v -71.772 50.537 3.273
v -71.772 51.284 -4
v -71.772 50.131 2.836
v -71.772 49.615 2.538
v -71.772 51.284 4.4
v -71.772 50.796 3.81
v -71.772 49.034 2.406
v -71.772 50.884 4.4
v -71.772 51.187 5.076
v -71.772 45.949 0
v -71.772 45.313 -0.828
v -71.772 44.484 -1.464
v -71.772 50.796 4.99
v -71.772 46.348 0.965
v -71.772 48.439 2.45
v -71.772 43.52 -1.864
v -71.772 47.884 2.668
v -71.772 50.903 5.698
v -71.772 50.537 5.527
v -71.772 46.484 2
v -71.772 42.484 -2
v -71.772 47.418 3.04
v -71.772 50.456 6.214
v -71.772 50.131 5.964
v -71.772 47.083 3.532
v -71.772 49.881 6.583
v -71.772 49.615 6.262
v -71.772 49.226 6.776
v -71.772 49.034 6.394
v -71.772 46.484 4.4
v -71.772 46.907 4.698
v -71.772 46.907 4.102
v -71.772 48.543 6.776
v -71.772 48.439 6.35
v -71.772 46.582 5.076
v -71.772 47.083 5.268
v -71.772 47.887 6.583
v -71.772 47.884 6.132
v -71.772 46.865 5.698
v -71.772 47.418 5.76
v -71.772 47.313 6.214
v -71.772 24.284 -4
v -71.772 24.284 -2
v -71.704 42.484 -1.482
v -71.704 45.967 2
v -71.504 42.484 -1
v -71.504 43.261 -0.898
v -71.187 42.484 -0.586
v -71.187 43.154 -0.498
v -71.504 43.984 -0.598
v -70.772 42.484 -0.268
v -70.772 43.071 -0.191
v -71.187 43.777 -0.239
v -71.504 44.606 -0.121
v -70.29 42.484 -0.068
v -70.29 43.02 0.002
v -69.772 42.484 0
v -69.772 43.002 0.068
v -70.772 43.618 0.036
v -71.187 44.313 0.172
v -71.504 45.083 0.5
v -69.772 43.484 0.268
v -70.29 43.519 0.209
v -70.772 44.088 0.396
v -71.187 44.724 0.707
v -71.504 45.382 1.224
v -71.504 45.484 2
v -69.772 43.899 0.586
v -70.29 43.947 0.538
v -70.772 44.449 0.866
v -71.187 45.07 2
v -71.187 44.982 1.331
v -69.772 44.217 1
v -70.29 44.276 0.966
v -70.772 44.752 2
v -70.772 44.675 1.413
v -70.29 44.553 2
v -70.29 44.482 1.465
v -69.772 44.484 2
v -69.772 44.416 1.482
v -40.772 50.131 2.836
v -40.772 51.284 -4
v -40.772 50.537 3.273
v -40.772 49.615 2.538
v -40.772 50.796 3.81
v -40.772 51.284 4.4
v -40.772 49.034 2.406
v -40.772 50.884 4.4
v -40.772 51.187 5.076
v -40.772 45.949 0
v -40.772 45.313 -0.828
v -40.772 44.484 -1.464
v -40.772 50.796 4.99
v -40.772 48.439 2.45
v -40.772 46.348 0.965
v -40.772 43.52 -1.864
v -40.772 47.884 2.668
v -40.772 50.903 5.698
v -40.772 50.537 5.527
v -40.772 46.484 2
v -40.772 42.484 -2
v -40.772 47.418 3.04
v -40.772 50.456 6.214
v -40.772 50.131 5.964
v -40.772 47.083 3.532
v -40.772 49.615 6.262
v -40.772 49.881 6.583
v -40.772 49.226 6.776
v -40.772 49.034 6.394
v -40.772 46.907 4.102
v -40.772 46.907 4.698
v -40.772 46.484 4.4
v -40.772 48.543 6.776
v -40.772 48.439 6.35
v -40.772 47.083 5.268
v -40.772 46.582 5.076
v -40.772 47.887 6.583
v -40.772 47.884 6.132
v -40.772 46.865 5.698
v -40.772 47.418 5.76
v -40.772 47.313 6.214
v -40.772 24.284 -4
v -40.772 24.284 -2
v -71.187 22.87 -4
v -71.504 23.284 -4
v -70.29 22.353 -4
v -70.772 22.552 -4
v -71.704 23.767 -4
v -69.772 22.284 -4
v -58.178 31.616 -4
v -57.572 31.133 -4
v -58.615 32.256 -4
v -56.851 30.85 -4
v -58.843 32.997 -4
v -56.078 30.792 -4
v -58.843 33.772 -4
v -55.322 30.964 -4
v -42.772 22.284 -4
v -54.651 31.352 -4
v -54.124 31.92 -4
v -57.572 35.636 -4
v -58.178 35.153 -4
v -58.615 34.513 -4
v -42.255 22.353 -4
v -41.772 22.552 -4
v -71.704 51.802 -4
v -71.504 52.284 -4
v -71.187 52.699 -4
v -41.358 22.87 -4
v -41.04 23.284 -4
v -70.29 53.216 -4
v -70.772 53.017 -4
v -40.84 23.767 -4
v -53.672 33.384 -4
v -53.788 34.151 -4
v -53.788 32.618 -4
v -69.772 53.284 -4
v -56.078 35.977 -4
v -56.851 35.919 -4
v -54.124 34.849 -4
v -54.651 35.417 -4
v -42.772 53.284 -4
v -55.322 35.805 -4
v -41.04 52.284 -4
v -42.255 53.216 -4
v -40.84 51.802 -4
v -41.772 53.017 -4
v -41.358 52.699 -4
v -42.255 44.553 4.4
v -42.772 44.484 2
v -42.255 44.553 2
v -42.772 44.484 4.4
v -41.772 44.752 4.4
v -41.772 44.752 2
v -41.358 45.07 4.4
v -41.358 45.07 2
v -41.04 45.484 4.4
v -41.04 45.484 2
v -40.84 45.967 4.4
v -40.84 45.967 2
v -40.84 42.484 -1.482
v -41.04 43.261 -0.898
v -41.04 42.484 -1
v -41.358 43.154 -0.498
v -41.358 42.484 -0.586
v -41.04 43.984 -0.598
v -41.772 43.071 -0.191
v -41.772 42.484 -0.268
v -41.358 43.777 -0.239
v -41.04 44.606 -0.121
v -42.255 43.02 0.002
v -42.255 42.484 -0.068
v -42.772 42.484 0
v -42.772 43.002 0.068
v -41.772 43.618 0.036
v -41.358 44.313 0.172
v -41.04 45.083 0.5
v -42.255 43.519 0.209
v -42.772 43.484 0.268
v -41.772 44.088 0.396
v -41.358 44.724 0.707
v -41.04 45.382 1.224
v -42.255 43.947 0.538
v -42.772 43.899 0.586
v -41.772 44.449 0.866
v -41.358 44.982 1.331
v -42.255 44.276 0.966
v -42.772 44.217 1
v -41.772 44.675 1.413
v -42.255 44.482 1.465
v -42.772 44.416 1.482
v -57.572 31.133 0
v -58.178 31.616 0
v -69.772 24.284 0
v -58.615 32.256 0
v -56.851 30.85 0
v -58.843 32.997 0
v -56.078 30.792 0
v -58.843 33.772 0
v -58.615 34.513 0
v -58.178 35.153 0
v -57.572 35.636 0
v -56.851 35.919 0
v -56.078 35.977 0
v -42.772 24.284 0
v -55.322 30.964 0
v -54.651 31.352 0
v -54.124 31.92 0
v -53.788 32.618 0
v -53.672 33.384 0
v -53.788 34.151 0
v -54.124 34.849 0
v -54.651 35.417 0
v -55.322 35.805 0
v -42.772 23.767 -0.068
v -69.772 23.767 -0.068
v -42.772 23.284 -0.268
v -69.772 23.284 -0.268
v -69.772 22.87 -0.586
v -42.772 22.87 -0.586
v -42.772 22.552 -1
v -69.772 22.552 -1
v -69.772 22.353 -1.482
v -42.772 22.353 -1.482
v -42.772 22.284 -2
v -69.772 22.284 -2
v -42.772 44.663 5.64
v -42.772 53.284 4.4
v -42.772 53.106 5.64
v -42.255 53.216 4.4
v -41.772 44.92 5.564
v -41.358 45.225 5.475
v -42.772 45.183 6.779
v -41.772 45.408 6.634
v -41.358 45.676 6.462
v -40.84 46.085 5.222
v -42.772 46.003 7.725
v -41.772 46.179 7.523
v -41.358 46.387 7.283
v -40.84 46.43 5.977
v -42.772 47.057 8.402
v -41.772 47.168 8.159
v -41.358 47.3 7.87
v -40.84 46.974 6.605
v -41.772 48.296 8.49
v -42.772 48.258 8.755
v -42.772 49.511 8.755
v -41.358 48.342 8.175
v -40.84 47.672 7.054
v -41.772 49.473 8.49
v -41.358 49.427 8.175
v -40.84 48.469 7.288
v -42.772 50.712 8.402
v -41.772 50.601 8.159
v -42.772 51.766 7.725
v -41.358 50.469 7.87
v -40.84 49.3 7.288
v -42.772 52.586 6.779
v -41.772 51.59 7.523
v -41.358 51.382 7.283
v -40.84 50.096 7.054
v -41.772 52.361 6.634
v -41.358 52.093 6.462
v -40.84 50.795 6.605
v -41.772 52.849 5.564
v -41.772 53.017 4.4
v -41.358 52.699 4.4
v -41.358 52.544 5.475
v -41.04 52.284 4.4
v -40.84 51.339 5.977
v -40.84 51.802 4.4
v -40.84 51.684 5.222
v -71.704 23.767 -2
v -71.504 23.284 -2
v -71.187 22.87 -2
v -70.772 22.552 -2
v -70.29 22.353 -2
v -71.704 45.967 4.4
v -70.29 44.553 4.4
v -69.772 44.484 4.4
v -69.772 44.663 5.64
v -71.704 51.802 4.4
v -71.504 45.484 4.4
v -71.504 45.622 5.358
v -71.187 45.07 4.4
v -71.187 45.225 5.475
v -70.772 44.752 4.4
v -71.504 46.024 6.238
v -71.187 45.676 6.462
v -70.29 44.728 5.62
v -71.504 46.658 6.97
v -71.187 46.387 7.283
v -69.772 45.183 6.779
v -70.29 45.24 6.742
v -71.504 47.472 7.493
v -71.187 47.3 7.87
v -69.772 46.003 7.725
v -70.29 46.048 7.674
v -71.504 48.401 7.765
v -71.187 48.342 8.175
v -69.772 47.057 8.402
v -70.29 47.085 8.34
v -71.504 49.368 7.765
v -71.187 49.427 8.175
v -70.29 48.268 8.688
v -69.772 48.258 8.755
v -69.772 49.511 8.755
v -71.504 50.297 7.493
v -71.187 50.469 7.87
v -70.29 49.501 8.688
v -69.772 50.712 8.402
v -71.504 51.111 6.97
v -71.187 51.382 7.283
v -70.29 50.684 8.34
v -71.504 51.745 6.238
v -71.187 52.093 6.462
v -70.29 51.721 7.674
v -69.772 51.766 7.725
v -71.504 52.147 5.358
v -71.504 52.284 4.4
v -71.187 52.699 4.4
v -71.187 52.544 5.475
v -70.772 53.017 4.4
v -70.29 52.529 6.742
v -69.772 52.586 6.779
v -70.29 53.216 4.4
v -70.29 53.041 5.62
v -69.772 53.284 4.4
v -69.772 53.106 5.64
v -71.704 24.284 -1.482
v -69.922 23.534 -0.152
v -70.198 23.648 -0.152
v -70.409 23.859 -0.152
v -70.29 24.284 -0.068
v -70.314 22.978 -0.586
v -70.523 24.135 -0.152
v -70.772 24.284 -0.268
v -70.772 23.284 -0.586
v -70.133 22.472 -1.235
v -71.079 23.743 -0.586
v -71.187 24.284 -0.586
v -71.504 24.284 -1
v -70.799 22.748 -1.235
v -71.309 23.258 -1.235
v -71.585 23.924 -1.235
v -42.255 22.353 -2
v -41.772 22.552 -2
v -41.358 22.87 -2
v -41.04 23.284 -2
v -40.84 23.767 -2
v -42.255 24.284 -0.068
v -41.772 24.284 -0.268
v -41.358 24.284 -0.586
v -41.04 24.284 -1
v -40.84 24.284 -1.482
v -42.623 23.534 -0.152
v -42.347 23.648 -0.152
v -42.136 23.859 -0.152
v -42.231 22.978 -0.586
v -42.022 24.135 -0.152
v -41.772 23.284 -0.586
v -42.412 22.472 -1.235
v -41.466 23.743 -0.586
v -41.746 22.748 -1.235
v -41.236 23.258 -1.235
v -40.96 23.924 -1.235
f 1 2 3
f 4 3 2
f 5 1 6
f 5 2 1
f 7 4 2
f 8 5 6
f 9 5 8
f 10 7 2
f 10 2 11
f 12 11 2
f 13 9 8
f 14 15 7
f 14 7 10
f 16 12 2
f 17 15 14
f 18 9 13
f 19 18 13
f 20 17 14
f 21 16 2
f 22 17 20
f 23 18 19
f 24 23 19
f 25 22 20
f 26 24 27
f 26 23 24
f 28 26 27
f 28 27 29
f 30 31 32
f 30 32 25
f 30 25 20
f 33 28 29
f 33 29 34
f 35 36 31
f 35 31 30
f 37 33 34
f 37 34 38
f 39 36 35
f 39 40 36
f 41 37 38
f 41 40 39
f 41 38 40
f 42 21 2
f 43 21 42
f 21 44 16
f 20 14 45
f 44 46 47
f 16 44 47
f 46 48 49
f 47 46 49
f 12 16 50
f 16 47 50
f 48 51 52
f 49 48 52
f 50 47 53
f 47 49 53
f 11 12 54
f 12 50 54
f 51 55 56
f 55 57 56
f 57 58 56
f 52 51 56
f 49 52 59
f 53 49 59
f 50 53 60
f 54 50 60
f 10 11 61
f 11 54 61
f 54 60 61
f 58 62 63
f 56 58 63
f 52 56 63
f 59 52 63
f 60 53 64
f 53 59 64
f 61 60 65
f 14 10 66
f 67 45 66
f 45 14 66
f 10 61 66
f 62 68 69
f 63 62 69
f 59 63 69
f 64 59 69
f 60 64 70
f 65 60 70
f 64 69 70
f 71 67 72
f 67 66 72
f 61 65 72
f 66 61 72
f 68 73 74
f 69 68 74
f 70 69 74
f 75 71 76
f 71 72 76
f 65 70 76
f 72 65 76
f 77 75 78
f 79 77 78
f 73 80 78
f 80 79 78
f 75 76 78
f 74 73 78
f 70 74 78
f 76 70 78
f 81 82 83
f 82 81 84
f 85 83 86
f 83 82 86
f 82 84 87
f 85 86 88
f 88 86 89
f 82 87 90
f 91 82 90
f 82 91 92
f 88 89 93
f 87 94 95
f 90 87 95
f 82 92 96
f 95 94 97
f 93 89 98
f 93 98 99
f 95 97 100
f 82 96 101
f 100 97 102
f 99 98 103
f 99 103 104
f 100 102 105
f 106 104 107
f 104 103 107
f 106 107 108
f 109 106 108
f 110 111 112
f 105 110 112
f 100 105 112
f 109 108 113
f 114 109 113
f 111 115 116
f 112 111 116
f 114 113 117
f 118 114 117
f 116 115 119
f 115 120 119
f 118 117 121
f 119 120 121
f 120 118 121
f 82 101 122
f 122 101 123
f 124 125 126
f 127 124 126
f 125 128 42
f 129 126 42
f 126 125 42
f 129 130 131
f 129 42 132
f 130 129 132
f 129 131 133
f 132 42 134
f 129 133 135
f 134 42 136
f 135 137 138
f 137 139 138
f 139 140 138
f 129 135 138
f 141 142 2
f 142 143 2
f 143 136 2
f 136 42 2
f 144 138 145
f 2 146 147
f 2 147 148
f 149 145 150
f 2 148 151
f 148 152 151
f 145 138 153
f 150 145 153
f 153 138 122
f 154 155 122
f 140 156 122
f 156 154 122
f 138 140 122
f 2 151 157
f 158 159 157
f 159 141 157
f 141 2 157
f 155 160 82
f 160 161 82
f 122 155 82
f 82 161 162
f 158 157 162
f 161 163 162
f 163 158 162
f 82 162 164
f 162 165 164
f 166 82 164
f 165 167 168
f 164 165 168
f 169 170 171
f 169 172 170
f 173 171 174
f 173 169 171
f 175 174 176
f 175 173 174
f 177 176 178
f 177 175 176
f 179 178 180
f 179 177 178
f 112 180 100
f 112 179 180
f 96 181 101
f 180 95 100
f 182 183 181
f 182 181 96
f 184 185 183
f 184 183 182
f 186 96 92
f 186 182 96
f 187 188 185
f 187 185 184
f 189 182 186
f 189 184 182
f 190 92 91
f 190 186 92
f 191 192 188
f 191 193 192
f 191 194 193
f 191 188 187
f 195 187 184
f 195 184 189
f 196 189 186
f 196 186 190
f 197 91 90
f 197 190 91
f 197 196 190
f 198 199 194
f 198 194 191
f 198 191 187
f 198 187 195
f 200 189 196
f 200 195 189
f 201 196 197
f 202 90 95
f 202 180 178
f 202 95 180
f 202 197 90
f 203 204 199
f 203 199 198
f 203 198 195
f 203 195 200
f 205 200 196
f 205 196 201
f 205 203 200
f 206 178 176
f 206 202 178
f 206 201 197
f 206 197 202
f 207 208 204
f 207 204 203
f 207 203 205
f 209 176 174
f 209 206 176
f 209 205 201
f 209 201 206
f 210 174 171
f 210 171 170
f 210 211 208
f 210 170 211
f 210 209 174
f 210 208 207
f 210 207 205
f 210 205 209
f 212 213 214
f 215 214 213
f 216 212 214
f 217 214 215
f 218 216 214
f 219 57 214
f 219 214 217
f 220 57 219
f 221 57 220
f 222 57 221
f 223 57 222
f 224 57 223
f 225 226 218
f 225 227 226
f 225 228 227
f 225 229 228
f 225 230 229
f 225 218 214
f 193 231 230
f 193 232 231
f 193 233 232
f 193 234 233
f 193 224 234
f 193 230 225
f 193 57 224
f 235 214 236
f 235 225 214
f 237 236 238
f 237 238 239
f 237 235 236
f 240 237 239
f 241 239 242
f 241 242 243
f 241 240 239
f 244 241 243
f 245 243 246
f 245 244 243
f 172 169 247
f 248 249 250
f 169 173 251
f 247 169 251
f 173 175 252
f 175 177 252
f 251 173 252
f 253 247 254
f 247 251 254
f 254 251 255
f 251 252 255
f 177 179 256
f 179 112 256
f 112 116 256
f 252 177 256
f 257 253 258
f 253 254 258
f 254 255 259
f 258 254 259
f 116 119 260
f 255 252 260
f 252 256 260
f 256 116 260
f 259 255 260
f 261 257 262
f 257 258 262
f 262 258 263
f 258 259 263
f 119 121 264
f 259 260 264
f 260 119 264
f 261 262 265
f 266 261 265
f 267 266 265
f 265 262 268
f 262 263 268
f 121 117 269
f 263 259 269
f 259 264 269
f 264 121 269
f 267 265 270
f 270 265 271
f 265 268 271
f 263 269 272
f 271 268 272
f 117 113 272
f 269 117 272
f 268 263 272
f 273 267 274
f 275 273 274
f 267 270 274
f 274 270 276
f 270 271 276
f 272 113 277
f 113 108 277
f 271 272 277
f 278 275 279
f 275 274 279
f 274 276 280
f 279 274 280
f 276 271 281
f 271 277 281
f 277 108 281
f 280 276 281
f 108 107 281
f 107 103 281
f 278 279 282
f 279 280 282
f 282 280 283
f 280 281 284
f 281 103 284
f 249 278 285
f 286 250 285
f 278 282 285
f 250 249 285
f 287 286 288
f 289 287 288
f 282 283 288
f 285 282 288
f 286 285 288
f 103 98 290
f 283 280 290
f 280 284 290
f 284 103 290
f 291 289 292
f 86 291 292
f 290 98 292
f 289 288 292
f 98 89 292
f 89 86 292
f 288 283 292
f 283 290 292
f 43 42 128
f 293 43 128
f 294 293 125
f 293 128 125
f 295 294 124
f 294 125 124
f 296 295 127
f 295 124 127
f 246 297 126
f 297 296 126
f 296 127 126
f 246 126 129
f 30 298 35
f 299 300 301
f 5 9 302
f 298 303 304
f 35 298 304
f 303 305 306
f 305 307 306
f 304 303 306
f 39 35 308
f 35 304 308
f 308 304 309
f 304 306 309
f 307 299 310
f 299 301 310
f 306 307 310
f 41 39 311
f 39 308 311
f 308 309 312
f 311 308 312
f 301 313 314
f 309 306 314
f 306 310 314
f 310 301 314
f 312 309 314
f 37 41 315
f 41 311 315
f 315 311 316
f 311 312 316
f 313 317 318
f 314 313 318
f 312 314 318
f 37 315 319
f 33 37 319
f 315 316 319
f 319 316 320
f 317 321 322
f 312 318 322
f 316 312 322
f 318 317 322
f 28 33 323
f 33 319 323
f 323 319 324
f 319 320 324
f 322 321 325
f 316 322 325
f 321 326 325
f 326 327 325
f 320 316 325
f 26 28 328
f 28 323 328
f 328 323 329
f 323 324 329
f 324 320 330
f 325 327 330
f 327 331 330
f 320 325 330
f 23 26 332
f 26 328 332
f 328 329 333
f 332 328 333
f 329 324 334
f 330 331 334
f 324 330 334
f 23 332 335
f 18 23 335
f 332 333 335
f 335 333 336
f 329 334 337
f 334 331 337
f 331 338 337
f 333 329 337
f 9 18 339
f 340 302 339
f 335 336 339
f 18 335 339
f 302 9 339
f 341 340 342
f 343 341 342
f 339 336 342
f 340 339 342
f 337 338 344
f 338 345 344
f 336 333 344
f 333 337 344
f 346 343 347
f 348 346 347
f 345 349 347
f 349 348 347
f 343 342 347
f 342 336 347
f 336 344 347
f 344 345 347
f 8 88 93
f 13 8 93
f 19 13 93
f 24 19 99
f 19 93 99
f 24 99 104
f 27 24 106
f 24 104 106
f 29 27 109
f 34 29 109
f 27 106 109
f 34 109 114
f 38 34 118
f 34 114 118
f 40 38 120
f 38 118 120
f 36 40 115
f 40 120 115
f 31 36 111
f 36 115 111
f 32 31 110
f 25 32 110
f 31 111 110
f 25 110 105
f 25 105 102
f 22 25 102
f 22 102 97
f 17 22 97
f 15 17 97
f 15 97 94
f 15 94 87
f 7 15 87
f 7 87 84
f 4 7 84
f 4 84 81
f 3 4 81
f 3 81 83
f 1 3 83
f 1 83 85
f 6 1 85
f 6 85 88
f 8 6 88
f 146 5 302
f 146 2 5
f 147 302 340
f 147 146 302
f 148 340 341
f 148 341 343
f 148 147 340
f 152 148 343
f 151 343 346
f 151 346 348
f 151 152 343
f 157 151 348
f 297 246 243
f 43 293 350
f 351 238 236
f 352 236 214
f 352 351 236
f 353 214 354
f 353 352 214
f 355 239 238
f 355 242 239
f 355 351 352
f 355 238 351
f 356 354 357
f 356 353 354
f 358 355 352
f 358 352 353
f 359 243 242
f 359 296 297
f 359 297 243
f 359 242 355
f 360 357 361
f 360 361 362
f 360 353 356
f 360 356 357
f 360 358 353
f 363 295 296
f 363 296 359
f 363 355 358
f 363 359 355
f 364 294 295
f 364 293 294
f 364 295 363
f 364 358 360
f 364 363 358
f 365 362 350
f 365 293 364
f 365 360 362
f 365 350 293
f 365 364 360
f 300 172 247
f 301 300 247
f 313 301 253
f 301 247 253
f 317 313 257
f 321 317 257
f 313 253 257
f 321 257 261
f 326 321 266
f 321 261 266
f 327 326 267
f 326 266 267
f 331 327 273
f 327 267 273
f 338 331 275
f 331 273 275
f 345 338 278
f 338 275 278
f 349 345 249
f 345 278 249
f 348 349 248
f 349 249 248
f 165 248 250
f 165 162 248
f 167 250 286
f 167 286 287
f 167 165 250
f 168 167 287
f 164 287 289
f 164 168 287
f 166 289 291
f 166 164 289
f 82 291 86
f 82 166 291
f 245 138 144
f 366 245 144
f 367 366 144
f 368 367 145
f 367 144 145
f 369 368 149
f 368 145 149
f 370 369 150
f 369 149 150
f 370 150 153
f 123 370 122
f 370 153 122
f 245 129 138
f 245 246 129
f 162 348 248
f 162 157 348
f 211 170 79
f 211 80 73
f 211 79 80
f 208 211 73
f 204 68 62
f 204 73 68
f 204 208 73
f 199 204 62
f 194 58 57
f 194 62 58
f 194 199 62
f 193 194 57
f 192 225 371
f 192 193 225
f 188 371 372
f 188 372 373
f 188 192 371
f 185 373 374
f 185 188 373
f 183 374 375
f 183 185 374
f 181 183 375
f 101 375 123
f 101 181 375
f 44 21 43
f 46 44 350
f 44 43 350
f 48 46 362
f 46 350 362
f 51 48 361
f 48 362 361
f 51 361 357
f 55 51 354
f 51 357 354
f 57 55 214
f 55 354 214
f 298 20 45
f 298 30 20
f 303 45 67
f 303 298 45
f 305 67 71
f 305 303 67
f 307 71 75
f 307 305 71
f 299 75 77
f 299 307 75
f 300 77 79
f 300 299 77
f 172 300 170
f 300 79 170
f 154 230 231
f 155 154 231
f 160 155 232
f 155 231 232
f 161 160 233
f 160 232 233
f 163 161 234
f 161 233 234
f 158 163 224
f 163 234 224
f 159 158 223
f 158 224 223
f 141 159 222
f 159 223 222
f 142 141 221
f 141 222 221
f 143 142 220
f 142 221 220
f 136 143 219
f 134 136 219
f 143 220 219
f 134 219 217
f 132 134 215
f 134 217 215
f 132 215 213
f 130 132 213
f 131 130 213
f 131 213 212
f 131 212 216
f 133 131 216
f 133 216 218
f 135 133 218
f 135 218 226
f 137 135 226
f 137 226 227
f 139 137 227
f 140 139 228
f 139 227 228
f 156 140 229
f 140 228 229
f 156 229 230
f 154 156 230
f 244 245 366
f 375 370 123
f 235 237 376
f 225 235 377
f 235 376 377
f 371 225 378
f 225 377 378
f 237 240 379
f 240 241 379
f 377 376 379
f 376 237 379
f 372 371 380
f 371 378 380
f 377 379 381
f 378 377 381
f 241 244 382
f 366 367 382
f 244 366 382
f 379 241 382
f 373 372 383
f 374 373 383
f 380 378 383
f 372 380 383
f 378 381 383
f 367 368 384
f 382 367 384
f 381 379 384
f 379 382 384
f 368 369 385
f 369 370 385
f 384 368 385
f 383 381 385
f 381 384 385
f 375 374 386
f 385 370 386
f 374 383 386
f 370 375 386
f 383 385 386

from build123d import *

# Parameters (mm, degrees)
F0_W     = 31
F0_H     = 8.8
F0_H_2   = 22.2
F0_R     = 2.6
F1_DEPTH = 4
F2_DEPTH = 4.4
F3_W     = 31
F3_H     = 4.4
F5_R     = 2
F6_DEPTH = 31.001
F7_R     = 2


with BuildPart() as f1:
    # F0 (on Top) → F1 (new body)
    with BuildSketch(Plane.XY):
        with Locations((-56.2723039389, 48.8844518721)):
            Rectangle(F0_W, F0_H)
        with Locations((-56.2723039389, 33.3844518721)):
            Rectangle(F0_W, F0_H_2)
        with Locations((-56.2723039389, 33.3844518721)):
            Circle(F0_R, mode=Mode.SUBTRACT)
    extrude(amount=-F1_DEPTH)

    # F0 (on Top) → F2 (join)
    with BuildSketch(Plane.XY):
        with Locations((-56.2723039389, 48.8844518721)):
            Rectangle(F0_W, F0_H)
    extrude(amount=F2_DEPTH)

    # F3 (on face) → F4 (revolve)
    with BuildSketch(Plane.XY.offset(4.4)):
        with Locations((-56.2723039389, 46.6844518721)):
            Rectangle(F3_W, F3_H)
    revolve(axis=Axis((-56.2723039389, 48.8844518721, 4.4), (-1, 0, 0)))

    # F5 (on face) → F6 (cut, through all)
    with BuildSketch(Plane.YZ.offset(-40.7723039389)):
        with Locations((48.8844518721, 4.4)):
            Circle(F5_R)
    extrude(amount=-F6_DEPTH, mode=Mode.SUBTRACT)

    # F7
    f7_edges = [f1.edges().sort_by_distance(p)[0] for p in [
        (-56.272304, 44.484452, 0),
        (-40.772304, 22.284452, -2),
        (-71.772304, 22.284452, -2),
        (-56.272304, 22.284452, 0),
        (-40.772304, 33.384452, 0),
        (-71.772304, 33.384452, 0),
        (-71.772304, 53.284452, 0.2),
        (-40.772304, 53.284452, 0.2),
        (-71.772304, 48.884452, 8.8),
        (-40.772304, 48.884452, 8.8),
    ]]
    fillet(f7_edges, radius=F7_R)


solid = f1.part
